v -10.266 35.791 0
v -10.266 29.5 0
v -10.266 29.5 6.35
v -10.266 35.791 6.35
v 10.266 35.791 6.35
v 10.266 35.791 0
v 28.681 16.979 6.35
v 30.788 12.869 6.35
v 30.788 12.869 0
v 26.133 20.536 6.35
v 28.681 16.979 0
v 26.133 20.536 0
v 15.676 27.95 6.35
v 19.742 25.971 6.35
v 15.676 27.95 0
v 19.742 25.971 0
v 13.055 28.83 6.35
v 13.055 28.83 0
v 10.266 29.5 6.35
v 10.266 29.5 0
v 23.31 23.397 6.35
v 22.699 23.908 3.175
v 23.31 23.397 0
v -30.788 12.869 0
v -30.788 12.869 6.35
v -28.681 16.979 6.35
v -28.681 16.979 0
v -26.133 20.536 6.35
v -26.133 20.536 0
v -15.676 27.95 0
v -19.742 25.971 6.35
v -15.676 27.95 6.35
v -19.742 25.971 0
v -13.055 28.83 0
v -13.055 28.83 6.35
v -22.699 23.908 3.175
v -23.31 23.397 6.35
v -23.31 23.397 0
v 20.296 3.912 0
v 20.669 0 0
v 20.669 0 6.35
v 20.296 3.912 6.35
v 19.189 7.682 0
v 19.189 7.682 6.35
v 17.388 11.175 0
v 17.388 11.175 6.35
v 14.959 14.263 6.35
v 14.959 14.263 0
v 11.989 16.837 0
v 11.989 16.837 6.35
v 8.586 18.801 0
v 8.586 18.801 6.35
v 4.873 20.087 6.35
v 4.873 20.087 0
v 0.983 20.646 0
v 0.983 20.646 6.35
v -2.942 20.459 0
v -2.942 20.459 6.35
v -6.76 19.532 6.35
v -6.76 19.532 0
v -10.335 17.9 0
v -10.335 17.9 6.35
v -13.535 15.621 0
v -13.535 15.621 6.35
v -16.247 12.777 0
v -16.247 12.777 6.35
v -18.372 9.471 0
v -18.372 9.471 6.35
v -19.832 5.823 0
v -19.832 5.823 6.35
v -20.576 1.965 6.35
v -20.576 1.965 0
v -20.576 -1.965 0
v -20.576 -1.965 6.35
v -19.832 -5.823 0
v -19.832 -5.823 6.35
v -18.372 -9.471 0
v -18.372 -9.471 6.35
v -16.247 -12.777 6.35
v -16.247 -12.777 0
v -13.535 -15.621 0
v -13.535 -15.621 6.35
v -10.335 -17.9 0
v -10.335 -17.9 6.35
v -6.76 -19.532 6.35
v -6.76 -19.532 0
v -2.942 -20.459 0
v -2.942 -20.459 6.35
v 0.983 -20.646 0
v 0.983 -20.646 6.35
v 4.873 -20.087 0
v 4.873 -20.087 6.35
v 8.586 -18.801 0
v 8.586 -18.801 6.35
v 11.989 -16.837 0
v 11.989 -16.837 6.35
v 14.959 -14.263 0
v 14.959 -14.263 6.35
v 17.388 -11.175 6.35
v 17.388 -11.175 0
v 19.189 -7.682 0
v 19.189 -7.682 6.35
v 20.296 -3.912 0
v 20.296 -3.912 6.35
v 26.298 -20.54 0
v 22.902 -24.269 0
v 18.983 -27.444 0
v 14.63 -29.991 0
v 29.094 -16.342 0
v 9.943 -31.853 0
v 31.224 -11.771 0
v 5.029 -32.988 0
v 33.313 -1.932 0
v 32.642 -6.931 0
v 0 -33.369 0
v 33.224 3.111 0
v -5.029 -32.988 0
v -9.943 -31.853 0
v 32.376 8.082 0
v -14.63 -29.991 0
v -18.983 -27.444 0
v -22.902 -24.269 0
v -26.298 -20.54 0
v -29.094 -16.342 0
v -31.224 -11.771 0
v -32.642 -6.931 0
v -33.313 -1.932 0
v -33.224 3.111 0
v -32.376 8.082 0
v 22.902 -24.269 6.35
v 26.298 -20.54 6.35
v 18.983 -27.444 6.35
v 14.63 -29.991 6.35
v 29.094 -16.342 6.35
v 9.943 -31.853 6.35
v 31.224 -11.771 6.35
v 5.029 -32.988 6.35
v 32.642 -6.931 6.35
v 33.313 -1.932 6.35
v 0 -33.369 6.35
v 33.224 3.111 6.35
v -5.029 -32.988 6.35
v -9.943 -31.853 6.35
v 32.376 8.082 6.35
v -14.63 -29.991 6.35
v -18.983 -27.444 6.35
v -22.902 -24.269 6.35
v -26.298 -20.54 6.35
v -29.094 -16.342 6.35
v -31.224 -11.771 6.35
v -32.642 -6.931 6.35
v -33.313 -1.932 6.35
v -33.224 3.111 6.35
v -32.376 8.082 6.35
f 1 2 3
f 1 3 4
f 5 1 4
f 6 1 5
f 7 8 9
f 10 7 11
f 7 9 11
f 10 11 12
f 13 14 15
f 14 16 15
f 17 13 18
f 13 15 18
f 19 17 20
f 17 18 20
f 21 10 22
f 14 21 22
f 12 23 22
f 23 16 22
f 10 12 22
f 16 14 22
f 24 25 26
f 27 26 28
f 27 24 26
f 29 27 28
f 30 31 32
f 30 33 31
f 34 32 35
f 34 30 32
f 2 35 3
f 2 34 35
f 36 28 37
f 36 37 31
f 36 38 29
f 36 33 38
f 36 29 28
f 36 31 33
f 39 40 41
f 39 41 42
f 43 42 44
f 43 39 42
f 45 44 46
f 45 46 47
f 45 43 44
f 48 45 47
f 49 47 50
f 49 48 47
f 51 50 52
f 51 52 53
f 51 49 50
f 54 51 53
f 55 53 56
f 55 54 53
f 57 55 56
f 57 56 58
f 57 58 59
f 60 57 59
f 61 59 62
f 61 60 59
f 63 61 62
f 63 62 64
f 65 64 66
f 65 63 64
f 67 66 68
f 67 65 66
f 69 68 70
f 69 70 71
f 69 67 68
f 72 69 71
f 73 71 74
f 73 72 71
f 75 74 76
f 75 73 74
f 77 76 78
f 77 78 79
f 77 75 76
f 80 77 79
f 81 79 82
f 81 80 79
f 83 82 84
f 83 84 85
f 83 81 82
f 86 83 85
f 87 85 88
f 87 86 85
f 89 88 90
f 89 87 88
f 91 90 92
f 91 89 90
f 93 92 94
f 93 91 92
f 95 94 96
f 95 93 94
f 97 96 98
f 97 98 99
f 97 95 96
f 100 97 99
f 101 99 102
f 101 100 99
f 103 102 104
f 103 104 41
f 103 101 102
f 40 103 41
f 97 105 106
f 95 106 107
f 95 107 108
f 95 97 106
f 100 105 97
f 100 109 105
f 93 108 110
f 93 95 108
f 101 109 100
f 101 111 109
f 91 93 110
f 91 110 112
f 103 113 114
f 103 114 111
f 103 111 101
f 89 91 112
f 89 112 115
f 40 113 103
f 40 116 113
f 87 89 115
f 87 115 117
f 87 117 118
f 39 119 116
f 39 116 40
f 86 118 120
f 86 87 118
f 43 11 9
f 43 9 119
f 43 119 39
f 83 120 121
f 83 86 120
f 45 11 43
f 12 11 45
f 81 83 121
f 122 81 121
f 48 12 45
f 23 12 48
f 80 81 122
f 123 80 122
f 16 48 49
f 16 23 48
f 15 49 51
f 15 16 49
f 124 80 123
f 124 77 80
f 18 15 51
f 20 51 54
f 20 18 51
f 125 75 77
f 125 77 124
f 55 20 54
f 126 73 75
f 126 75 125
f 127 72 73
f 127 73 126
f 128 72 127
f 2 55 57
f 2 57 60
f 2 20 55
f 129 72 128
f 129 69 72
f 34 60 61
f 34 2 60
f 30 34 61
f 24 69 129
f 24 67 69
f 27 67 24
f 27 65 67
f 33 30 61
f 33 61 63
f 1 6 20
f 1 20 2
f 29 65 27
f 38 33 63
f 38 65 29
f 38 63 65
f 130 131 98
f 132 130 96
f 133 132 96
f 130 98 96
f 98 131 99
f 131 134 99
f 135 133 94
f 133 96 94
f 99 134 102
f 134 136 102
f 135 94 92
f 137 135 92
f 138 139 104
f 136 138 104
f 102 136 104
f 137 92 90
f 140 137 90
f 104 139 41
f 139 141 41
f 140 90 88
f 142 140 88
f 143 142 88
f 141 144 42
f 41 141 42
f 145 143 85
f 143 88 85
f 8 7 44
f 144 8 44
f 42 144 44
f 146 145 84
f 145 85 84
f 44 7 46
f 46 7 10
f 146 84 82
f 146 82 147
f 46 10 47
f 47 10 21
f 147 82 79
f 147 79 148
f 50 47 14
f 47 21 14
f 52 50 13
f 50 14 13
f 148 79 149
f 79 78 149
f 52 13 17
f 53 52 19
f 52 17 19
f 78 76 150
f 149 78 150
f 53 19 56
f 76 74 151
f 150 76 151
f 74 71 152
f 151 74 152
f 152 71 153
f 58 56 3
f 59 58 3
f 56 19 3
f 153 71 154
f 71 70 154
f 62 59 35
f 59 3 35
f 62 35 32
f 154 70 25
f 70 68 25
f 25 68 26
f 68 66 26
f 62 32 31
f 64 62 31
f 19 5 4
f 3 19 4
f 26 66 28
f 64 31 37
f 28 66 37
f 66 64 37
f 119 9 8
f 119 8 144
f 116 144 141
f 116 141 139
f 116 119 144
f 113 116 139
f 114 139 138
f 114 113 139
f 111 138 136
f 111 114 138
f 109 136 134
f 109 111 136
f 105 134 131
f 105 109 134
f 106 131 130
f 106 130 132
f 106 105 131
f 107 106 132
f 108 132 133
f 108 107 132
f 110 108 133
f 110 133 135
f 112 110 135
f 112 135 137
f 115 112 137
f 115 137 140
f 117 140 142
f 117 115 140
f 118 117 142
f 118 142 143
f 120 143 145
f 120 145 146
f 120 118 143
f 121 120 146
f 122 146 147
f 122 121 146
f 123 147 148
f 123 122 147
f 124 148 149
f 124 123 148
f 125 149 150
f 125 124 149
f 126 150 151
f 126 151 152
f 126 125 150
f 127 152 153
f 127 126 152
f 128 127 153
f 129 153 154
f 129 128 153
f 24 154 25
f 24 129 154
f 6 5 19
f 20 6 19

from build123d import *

# Parameters (mm, degrees)
SKETCH1_R           = 20.66925
BOSS_EXTRUDE1_DEPTH = 6.35


with BuildPart() as part:
    # Sketch1 → Boss-Extrude1 (new body)
    with BuildSketch(Plane.XY):
        with BuildLine():
            Line((-10.265793628, 35.791116693), (10.265793628, 35.791116693))
            Line((10.265793628, 35.791116693), (10.265793628, 29.50036983))
            add(Edge.make_bspline(
                [(30.787817782, 12.869231593), (24.871862383, 26.630631307), (10.265793628, 29.50036983)],
                knots=[0, 0, 0, 1, 1, 1], degree=2))
            ThreePointArc((30.787817782, 12.869231593), (0, -33.36925), (-30.787817782, 12.869231593))
            add(Edge.make_bspline(
                [(-30.787817782, 12.869231593), (-24.871862383, 26.630631307), (-10.265793628, 29.50036983)],
                knots=[0, 0, 0, 1, 1, 1], degree=2))
            Line((-10.265793628, 29.50036983), (-10.265793628, 35.791116693))
        make_face()
        Circle(SKETCH1_R, mode=Mode.SUBTRACT)
    extrude(amount=BOSS_EXTRUDE1_DEPTH)


solid = part.part
